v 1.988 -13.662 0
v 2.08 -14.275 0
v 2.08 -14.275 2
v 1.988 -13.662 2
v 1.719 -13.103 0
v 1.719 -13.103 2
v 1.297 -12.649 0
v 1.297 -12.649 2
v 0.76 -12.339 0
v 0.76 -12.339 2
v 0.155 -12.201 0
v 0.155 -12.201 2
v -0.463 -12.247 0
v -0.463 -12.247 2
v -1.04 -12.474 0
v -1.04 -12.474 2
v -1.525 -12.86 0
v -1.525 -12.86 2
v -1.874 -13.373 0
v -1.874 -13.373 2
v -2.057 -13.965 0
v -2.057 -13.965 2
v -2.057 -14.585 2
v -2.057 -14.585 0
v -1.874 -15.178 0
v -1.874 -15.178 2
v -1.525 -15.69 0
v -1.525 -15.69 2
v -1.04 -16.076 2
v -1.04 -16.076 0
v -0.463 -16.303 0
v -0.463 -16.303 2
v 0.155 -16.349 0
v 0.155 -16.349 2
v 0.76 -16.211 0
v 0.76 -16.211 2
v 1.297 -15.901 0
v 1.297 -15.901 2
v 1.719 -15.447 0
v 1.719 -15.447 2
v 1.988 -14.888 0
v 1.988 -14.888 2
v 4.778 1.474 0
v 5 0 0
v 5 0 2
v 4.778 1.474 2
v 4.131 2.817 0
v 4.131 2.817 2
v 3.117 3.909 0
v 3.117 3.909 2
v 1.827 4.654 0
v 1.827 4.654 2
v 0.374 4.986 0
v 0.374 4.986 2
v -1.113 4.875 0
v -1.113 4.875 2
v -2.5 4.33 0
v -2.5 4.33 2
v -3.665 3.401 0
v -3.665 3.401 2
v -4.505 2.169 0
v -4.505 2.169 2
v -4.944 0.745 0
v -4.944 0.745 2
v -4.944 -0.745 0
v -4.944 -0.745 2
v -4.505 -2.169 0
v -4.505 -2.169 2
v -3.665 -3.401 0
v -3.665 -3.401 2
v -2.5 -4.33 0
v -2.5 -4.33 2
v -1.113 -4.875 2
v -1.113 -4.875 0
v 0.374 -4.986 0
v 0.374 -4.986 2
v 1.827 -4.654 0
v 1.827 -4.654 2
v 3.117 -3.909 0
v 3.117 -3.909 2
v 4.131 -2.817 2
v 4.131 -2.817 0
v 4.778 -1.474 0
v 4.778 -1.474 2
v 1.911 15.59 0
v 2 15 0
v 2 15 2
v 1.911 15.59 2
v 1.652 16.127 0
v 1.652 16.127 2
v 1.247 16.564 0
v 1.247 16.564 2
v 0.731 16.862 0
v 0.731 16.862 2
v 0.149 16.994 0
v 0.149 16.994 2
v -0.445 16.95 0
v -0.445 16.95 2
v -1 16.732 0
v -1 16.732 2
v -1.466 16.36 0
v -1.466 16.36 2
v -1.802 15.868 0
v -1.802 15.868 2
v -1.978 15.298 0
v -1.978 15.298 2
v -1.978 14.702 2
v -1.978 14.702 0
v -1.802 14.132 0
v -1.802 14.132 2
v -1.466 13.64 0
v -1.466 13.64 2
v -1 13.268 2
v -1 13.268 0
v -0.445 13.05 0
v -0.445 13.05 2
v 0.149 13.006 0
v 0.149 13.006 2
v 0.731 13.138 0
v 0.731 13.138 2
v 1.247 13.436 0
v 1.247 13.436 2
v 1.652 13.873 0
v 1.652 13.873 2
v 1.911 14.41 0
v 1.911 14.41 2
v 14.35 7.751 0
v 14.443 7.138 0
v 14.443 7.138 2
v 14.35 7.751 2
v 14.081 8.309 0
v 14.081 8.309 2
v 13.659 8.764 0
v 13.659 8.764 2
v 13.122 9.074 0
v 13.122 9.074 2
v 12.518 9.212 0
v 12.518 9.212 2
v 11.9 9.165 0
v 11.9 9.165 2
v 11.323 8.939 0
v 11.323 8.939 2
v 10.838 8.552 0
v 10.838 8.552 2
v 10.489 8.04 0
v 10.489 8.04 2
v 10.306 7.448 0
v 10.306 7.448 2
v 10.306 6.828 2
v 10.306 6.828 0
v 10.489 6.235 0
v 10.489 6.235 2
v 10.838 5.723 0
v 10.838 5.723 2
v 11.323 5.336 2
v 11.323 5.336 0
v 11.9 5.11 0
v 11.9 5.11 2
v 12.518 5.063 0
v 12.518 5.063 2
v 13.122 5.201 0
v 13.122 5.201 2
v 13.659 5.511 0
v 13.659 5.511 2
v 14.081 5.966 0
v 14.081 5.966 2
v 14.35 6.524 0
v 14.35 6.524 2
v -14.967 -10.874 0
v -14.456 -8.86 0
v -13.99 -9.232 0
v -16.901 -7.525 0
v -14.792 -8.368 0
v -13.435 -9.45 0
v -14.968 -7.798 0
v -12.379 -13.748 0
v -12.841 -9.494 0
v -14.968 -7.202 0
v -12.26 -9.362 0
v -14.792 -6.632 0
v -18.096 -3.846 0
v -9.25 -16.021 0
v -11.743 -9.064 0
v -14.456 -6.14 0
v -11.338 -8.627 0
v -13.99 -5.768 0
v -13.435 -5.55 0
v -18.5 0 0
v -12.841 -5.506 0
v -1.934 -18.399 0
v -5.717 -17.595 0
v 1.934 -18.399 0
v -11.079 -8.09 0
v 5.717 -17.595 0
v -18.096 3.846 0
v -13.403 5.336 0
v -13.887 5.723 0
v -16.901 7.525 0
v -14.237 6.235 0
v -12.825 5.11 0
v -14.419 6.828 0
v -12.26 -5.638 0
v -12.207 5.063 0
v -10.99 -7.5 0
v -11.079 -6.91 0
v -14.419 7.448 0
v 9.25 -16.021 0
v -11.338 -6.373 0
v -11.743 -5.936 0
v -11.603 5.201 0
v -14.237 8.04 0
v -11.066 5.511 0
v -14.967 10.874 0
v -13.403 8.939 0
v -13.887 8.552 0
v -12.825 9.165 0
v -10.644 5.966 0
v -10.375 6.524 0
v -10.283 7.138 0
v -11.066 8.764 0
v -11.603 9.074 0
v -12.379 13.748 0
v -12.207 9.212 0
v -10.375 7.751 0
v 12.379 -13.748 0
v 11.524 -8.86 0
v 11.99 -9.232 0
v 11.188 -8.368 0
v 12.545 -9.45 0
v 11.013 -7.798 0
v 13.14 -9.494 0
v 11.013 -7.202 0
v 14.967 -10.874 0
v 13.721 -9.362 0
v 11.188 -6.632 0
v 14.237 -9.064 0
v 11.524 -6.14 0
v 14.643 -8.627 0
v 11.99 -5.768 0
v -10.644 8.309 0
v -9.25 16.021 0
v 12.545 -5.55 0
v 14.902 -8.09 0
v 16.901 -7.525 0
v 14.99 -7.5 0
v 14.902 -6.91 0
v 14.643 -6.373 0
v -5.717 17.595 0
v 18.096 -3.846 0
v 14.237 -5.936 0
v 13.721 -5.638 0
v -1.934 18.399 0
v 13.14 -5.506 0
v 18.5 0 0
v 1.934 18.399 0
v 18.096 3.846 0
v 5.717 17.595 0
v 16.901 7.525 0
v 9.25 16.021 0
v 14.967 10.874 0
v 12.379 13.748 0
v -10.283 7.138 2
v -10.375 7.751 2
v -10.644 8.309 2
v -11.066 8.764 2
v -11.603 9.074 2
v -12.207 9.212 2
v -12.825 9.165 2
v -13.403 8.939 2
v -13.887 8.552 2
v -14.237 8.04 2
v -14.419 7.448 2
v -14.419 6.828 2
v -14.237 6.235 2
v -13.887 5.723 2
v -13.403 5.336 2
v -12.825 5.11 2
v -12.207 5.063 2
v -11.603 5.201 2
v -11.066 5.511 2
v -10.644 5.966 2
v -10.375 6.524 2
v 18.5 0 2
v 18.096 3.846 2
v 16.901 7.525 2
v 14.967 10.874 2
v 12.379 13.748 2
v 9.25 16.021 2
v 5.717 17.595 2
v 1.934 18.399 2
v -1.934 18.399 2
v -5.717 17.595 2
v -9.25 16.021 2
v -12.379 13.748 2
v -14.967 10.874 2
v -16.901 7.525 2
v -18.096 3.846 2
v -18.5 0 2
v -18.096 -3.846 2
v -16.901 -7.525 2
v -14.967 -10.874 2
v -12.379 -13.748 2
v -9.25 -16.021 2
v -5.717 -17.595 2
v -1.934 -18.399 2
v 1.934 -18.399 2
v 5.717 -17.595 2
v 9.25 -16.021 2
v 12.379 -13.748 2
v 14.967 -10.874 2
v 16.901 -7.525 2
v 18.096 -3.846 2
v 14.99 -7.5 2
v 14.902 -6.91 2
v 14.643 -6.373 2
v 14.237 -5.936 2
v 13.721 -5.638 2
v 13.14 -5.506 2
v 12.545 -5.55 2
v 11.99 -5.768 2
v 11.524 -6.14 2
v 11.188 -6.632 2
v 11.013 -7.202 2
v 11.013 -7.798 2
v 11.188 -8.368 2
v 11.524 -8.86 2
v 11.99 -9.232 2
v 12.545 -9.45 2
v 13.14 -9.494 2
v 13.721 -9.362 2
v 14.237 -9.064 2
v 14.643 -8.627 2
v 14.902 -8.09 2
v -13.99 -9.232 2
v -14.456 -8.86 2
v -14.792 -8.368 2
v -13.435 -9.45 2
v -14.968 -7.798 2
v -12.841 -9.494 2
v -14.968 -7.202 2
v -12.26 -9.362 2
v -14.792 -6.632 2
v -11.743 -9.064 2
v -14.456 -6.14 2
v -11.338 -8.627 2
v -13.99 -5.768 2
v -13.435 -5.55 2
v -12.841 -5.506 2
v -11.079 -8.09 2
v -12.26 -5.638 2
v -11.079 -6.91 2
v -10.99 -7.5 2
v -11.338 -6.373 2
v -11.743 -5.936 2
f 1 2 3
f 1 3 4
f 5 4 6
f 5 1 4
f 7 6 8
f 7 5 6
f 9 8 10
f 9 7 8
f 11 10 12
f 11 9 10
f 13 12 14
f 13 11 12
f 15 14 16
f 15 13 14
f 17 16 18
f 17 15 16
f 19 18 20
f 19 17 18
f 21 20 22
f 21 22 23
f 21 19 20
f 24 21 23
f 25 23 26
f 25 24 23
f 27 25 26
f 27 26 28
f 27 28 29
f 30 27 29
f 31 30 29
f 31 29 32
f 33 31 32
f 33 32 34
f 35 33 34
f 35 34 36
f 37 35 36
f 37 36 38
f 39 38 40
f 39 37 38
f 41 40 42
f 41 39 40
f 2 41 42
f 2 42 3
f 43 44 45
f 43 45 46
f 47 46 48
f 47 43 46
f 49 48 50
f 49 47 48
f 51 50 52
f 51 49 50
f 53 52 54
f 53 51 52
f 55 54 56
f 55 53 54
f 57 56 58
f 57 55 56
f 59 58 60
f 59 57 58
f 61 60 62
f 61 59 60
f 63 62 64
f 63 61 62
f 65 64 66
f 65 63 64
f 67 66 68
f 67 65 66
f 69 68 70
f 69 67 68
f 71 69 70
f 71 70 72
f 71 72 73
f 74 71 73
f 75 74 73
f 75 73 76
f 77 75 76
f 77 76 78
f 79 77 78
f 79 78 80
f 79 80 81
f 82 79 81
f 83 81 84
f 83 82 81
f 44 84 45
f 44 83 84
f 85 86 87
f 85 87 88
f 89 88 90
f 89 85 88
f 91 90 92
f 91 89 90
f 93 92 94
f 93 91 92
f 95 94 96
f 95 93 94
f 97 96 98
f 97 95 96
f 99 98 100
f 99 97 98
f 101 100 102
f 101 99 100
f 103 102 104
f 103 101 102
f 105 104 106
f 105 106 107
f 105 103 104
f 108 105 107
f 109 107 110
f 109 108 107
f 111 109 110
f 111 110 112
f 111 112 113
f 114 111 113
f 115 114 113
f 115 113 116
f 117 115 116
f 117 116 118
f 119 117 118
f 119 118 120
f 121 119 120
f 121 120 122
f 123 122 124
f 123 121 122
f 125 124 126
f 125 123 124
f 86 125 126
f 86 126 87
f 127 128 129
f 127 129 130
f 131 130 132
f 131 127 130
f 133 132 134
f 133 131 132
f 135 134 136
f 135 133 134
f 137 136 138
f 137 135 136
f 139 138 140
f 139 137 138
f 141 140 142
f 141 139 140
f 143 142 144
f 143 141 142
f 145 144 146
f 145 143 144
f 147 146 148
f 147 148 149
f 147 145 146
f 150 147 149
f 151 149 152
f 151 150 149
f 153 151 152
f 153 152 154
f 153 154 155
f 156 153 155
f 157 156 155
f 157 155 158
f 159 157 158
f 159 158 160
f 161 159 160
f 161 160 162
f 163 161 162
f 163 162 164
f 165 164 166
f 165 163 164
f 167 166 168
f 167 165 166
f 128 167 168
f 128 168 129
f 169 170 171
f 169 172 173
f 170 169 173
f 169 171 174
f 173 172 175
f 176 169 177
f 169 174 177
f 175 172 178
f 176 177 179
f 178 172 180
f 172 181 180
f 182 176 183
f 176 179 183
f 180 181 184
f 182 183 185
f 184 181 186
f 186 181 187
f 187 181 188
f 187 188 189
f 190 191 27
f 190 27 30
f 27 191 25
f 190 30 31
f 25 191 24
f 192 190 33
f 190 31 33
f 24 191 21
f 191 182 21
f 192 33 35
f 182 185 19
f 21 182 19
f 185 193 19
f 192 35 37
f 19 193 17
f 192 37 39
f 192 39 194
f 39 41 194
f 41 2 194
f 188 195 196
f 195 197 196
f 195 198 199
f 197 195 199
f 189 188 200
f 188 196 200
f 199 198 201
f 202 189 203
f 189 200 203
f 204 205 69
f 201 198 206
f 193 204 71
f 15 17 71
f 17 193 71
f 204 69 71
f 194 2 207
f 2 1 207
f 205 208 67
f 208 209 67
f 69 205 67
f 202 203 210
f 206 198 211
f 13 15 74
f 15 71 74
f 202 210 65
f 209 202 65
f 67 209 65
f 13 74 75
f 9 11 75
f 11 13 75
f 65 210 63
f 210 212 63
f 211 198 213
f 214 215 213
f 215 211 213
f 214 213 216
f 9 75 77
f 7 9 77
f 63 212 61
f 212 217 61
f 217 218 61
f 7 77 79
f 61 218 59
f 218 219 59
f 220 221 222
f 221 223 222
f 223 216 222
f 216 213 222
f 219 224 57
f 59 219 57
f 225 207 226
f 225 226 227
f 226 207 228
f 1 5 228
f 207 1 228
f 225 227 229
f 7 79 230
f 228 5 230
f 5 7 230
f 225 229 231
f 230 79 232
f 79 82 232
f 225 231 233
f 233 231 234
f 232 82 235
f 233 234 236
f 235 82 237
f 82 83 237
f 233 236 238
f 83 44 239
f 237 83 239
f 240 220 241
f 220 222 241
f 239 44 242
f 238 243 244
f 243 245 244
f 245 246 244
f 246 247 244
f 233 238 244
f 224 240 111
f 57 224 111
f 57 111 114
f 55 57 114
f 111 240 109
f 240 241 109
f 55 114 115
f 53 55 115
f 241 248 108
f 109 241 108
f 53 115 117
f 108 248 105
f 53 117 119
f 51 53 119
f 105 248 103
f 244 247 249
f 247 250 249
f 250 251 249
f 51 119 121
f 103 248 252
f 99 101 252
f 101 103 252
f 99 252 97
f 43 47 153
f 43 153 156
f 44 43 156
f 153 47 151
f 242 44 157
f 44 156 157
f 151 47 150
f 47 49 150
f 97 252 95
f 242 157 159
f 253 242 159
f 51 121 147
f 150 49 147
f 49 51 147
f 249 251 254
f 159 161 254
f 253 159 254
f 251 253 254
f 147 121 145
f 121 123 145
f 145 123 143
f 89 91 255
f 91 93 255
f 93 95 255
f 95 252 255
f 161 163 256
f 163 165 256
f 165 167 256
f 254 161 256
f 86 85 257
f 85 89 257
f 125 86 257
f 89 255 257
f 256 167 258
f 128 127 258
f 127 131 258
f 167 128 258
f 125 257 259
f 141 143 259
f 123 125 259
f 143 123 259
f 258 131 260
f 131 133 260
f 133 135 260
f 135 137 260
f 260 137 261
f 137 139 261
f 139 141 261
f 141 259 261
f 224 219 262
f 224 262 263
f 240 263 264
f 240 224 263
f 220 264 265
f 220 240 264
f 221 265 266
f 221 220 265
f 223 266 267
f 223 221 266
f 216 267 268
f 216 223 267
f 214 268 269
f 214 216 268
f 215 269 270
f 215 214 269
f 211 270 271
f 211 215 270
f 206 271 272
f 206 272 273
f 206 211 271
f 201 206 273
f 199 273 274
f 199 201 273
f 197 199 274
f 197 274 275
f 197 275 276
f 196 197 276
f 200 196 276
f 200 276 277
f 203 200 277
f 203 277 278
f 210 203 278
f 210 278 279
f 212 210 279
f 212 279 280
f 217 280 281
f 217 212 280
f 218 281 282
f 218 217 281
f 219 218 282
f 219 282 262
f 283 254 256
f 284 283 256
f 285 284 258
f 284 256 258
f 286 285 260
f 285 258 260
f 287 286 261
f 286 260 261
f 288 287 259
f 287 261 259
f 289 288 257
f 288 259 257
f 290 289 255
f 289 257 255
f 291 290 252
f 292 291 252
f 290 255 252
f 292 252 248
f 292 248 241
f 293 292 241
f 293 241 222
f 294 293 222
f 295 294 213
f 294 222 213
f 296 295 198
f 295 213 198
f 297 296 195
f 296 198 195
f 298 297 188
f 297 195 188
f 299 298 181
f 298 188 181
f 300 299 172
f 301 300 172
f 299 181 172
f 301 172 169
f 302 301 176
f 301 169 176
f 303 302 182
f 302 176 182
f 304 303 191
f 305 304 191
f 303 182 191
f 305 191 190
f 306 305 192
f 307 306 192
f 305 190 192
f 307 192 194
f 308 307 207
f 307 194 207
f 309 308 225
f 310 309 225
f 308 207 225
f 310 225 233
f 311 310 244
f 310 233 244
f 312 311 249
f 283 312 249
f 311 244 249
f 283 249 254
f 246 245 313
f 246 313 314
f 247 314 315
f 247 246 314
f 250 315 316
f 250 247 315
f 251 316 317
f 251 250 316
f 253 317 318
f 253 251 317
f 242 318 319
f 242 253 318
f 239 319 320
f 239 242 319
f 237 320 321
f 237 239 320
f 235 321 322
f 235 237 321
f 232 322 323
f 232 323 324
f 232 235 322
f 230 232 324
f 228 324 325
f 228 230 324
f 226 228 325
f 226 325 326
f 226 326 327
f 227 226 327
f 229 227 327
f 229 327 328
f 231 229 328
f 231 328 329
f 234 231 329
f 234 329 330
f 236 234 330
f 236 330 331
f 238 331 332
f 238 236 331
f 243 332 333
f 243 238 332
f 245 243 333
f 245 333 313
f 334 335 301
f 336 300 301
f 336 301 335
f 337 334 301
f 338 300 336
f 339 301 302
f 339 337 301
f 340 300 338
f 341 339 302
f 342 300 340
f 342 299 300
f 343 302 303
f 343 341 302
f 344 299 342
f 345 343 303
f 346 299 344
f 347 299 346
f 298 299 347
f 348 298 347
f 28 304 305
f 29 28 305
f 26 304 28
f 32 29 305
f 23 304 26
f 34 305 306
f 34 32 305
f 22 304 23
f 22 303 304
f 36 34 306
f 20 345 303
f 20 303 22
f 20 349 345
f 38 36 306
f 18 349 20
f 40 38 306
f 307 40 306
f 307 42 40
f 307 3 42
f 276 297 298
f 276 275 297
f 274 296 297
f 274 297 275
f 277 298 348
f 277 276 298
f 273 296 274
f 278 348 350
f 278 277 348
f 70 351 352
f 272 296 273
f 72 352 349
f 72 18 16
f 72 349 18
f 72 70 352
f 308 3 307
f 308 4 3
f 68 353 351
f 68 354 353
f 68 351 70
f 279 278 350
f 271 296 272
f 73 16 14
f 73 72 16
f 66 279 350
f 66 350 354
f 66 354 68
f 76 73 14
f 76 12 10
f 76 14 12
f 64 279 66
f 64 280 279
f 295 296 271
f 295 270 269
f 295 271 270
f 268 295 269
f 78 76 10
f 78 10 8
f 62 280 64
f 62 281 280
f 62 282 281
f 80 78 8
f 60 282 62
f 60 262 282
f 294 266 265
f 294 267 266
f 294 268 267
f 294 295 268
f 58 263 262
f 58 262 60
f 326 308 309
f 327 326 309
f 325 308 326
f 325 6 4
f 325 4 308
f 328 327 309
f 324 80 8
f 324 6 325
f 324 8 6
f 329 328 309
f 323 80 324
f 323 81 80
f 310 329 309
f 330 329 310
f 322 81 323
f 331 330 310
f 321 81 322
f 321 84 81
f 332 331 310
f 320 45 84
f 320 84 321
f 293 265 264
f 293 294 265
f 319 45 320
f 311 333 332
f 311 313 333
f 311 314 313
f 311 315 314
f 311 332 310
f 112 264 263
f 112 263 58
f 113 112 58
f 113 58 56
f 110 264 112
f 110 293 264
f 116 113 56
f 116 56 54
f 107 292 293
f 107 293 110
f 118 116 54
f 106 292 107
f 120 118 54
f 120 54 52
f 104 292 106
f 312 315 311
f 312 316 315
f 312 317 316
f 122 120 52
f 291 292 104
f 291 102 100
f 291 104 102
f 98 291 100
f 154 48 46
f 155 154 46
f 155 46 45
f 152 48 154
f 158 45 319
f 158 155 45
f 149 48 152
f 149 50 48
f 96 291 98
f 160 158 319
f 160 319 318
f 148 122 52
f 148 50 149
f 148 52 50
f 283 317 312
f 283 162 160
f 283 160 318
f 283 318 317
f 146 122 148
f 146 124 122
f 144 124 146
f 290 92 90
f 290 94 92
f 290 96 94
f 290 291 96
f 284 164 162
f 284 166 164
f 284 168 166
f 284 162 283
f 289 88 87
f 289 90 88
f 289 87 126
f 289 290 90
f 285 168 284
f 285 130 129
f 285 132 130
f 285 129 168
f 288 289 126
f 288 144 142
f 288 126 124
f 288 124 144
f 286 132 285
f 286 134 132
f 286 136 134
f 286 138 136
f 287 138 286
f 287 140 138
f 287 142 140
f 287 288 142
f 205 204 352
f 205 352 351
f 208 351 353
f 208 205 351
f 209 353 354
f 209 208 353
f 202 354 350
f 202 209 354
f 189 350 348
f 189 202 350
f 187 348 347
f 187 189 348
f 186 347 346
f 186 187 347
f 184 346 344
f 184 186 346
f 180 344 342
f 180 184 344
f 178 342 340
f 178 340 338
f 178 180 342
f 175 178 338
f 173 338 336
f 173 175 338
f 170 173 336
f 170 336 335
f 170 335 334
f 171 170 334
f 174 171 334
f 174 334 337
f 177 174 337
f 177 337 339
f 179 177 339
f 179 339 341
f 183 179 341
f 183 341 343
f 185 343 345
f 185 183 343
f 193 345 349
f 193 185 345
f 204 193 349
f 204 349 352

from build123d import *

# Parameters (mm, degrees)
SKETCH_1_R      = 18.5
SKETCH_1_R_2    = 5
SKETCH_1_R_3    = 2
SKETCH_1_R_4    = 2.08
EXTRUDE_1_DEPTH = 2


with BuildPart() as part:
    # 草图1 → 凸台-拉伸1 (new body)
    with BuildSketch(Plane.XY):
        Circle(SKETCH_1_R)
        Circle(SKETCH_1_R_2, mode=Mode.SUBTRACT)
        with Locations((0, 15)):
            Circle(SKETCH_1_R_3, mode=Mode.SUBTRACT)
        with Locations((12.990381057, -7.5)):
            Circle(SKETCH_1_R_3, mode=Mode.SUBTRACT)
        with Locations((-12.990381057, -7.5)):
            Circle(SKETCH_1_R_3, mode=Mode.SUBTRACT)
        with Locations((-12.36258754, 7.137543244)):
            Circle(SKETCH_1_R_4, mode=Mode.SUBTRACT)
        with Locations((12.36258754, 7.137543244)):
            Circle(SKETCH_1_R_4, mode=Mode.SUBTRACT)
        with Locations((0, -14.275086489)):
            Circle(SKETCH_1_R_4, mode=Mode.SUBTRACT)
    extrude(amount=EXTRUDE_1_DEPTH)


solid = part.part
